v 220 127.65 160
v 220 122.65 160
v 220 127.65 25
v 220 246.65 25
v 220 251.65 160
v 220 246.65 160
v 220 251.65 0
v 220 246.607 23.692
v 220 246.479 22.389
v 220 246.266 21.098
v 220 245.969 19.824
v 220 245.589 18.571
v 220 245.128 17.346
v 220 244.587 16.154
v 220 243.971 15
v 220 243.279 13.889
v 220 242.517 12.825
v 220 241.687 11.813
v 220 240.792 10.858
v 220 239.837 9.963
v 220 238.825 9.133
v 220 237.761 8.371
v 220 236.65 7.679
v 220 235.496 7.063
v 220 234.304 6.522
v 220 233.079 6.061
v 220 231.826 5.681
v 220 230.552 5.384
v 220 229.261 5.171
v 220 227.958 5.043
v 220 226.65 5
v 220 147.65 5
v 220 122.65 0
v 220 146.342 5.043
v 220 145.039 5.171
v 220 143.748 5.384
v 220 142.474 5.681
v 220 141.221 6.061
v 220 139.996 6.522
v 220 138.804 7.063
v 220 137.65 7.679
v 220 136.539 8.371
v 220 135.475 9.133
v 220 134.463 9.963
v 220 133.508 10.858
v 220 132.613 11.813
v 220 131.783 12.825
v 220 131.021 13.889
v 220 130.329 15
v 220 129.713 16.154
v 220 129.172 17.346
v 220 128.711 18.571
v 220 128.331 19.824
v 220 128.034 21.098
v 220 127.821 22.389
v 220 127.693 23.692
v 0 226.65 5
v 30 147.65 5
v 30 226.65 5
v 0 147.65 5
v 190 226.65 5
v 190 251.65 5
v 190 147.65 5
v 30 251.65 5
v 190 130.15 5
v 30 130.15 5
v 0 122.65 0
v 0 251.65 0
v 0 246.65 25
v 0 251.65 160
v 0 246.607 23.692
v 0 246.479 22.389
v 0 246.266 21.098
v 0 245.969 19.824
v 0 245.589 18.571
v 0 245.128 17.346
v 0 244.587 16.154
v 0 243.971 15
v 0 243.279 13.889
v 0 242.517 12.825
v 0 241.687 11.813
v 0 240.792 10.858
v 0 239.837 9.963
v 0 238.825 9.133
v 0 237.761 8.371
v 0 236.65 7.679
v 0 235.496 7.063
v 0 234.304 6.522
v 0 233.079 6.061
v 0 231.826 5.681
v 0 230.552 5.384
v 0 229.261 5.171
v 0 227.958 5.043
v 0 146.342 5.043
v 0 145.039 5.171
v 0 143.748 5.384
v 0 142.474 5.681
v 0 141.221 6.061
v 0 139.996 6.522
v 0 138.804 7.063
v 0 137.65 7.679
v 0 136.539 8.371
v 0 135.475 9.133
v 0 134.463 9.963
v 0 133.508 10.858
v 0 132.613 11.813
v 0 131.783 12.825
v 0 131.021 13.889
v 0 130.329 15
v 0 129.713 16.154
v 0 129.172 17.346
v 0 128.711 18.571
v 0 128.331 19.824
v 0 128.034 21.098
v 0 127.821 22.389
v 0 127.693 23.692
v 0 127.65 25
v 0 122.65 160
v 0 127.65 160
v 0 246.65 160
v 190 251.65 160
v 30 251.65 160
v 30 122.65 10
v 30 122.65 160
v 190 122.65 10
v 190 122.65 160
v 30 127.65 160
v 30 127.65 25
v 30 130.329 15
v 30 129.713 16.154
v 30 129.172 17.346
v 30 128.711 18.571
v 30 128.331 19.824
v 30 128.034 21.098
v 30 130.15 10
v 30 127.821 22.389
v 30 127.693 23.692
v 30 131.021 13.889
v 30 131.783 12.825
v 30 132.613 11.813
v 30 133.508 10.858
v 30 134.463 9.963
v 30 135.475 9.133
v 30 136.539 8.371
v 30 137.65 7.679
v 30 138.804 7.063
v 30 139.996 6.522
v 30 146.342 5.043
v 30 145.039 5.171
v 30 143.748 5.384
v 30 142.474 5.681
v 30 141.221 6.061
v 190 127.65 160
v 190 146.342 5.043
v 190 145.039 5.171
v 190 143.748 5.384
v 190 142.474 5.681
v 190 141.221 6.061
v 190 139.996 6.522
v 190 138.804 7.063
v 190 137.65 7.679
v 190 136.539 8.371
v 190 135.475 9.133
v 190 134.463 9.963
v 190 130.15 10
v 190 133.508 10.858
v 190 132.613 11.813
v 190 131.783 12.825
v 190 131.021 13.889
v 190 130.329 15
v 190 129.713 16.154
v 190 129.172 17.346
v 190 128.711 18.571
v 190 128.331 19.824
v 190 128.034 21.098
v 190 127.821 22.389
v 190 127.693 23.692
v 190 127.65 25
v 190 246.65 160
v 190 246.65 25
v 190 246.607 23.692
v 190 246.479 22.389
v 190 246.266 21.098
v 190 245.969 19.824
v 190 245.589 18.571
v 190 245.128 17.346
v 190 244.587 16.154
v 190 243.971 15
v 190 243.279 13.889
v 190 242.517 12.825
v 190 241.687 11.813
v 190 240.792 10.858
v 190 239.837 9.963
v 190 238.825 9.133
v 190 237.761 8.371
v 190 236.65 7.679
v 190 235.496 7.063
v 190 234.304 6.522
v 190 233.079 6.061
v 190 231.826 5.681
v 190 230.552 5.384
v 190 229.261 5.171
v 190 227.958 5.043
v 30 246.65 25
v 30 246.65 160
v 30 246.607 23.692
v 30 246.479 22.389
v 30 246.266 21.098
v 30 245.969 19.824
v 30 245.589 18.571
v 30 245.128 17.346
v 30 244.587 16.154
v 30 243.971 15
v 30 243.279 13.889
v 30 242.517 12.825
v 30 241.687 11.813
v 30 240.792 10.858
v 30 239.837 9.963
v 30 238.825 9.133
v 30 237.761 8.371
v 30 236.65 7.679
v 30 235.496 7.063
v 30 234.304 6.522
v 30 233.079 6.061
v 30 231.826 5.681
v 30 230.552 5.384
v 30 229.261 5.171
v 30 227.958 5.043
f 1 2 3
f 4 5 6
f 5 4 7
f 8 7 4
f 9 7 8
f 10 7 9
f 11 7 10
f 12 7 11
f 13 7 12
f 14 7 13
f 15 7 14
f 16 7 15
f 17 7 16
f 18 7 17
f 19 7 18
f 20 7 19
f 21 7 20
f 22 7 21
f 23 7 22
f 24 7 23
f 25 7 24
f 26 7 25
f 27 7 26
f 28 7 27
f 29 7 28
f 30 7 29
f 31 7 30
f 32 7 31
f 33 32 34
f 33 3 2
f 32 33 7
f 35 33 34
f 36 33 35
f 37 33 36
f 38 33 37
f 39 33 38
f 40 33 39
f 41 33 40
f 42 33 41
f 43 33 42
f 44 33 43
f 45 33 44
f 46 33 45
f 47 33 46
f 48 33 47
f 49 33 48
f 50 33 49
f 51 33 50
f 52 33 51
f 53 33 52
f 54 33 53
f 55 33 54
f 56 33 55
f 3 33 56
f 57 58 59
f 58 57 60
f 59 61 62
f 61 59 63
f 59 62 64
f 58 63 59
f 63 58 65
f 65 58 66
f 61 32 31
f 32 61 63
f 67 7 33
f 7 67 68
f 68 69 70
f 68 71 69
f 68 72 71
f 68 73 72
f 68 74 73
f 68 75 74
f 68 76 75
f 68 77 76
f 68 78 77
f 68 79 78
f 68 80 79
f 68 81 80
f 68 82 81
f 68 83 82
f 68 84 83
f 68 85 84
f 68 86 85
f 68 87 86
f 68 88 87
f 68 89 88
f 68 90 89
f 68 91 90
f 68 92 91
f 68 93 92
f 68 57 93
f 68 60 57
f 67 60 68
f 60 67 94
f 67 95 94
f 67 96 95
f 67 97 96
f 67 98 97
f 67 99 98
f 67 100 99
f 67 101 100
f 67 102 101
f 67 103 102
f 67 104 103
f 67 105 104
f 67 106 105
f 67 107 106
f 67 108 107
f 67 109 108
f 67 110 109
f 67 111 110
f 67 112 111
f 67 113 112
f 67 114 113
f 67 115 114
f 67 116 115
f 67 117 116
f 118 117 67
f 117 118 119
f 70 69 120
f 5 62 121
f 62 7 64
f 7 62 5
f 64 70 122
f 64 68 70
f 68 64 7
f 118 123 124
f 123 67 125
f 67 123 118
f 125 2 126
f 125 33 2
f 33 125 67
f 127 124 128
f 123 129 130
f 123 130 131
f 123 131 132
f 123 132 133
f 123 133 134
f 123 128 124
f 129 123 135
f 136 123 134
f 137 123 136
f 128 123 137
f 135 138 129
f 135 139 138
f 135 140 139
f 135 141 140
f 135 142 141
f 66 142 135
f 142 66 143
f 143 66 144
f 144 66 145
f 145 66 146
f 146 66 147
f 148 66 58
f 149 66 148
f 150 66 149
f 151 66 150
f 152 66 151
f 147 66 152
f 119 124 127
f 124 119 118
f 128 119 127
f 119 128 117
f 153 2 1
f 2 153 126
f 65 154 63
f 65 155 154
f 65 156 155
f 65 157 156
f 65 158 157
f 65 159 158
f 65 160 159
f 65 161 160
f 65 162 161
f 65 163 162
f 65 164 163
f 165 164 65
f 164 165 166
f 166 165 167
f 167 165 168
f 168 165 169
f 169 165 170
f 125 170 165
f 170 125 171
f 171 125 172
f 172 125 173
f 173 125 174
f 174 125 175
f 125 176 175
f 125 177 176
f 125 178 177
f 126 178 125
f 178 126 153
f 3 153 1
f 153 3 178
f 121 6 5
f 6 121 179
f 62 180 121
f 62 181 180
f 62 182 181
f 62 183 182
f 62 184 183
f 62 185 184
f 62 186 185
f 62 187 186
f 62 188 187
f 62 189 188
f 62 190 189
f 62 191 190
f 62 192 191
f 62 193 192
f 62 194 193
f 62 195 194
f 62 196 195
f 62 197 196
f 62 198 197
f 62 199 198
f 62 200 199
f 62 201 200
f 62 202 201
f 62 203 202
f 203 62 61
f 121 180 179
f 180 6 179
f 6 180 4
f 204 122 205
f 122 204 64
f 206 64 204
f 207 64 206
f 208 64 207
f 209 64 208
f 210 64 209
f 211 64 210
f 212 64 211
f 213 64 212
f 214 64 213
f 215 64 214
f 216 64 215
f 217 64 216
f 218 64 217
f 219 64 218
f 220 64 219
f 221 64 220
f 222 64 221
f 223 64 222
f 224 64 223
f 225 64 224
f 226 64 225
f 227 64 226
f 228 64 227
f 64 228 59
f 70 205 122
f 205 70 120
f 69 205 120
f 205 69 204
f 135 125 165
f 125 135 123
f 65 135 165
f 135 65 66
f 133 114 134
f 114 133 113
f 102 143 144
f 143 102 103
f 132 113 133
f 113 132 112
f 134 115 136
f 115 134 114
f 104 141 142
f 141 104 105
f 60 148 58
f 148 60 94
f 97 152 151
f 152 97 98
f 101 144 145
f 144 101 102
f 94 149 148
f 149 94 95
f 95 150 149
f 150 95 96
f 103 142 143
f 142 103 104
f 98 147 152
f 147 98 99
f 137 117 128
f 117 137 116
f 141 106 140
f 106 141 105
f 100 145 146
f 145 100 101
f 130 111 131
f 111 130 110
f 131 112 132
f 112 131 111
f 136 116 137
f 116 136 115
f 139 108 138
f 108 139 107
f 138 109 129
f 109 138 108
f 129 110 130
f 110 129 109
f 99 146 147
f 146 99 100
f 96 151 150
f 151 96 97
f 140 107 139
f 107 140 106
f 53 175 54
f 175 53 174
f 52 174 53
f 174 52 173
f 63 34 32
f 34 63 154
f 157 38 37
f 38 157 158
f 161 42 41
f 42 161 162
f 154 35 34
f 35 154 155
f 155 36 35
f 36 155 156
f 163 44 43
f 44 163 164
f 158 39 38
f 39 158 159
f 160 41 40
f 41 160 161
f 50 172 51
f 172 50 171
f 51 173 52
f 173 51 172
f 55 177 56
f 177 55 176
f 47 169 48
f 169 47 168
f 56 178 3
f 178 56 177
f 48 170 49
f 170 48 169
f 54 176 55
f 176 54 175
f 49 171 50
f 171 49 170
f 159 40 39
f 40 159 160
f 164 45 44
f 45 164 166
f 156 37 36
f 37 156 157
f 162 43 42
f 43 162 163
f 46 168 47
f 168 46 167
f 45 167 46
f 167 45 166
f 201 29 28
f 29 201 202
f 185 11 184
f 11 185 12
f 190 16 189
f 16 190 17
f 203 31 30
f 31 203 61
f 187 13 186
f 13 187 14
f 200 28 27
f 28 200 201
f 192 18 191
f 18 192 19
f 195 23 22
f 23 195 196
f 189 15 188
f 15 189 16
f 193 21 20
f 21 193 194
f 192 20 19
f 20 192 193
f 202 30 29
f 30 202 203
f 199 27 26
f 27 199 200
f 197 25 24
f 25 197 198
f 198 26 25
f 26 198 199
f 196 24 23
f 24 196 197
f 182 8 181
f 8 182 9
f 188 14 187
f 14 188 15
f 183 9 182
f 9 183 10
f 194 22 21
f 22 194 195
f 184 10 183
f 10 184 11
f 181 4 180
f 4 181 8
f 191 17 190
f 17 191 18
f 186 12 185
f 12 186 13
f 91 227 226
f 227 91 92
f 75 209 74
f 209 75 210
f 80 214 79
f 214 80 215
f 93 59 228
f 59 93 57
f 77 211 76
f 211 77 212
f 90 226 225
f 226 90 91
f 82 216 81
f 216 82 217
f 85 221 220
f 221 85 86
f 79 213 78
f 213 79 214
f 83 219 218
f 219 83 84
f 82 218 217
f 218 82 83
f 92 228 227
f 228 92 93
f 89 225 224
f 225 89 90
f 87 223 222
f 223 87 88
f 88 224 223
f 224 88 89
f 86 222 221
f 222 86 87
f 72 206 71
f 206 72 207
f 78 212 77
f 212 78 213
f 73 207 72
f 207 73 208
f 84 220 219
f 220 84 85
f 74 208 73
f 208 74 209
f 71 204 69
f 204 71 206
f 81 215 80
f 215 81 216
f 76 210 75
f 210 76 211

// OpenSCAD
$fn=96;

dovetail_rad = 9.7;
width = 220;
depth = 129;
height = 5;
max_height = 160;
max_depth = 381;

leg_width = 30;
leg_depth = 5;
filet = 20;

module center() {
    difference() {
        union() {
            cube ([ width, depth+6.85, height ]);
        }
        
        //Add the dovetails
        for(i = [ 0 : width/9 : 224])
        {
          
          translate ([ i, 2, 0 ])
          color( "blue" )
          rotate ([ 180, 180, 90 ])
            cylinder( h = height, r = dovetail_rad, $fn = 3 );
        }
 
        for(i = [ 0 : width/9 : 224 ])
        {
          translate ([ i, depth+6.85-2, 0 ])
          color( "blue" )
          rotate ([ 0, 0, 90 ])
            cylinder( h = height, r = dovetail_rad, $fn = 3 );
        }     
    }
}

module side() {
    difference() {
        union() {
            //translate([ 0, depth, 0 ])
    
                cube ([ width, depth, height ]);
            //legs
            translate ([ 0, 0, height ])
                cube ([ leg_width, leg_depth, max_height-height ]);
            translate ([ width-leg_width, 0, height ])
                cube ([ leg_width, leg_depth, max_height-height ]);
            translate ([ width-leg_width, depth-leg_depth, height ])
                cube ([ leg_width, leg_depth, max_height-height ]);
            translate ([ 0, depth-leg_depth, height ])
                cube ([ leg_width, leg_depth, max_height-height ]);
            
            //dovetail support
            translate ([ leg_width, 0, leg_depth ])
                cube ([ width-leg_width*2, leg_depth*1.5, leg_depth ]);
            
            //fillets
          
            translate ([ 0, leg_depth, height ])
                cube ([ leg_width, 20, 20 ]);
            translate ([ width-leg_width, leg_depth, height ])
                cube ([ leg_width, 20, 20 ]);
            translate ([ width-leg_width, depth-filet-leg_depth, height ])
                cube ([ leg_width, 20, 20 ]);
            translate ([ 0, depth-filet-leg_depth, height ])
                cube ([ leg_width, 20, 20 ]);
            
        }
        //filet smooth
            translate ([ 0, filet+leg_depth, height+filet ])
            rotate([ 0, 90, 0 ])
                cylinder ( h = leg_width, r = 20 );
            translate ([ width-leg_width, filet+leg_depth, height+filet ])
            rotate([ 0, 90, 0 ])
                cylinder ( h = leg_width, r = 20 );
            translate ([ width-leg_width, depth-filet-leg_depth, height+filet ])
            rotate([ 0, 90, 0 ])
                cylinder ( h = leg_width, r = 20 );
            translate ([ 0, depth-filet-leg_depth, height+filet ])
            rotate([ 0, 90, 0 ])
                cylinder ( h = leg_width, r = 20 );
        
        
      
        
        }
        
    }


//center();
// /*
translate([ 0, depth-dovetail_rad/2-1.5, 0 ])
side();
// */
 /*
translate ([ 0, +dovetail_rad/2+1.5, 0 ])
mirror([0,1,0 ])
    side();
// */
